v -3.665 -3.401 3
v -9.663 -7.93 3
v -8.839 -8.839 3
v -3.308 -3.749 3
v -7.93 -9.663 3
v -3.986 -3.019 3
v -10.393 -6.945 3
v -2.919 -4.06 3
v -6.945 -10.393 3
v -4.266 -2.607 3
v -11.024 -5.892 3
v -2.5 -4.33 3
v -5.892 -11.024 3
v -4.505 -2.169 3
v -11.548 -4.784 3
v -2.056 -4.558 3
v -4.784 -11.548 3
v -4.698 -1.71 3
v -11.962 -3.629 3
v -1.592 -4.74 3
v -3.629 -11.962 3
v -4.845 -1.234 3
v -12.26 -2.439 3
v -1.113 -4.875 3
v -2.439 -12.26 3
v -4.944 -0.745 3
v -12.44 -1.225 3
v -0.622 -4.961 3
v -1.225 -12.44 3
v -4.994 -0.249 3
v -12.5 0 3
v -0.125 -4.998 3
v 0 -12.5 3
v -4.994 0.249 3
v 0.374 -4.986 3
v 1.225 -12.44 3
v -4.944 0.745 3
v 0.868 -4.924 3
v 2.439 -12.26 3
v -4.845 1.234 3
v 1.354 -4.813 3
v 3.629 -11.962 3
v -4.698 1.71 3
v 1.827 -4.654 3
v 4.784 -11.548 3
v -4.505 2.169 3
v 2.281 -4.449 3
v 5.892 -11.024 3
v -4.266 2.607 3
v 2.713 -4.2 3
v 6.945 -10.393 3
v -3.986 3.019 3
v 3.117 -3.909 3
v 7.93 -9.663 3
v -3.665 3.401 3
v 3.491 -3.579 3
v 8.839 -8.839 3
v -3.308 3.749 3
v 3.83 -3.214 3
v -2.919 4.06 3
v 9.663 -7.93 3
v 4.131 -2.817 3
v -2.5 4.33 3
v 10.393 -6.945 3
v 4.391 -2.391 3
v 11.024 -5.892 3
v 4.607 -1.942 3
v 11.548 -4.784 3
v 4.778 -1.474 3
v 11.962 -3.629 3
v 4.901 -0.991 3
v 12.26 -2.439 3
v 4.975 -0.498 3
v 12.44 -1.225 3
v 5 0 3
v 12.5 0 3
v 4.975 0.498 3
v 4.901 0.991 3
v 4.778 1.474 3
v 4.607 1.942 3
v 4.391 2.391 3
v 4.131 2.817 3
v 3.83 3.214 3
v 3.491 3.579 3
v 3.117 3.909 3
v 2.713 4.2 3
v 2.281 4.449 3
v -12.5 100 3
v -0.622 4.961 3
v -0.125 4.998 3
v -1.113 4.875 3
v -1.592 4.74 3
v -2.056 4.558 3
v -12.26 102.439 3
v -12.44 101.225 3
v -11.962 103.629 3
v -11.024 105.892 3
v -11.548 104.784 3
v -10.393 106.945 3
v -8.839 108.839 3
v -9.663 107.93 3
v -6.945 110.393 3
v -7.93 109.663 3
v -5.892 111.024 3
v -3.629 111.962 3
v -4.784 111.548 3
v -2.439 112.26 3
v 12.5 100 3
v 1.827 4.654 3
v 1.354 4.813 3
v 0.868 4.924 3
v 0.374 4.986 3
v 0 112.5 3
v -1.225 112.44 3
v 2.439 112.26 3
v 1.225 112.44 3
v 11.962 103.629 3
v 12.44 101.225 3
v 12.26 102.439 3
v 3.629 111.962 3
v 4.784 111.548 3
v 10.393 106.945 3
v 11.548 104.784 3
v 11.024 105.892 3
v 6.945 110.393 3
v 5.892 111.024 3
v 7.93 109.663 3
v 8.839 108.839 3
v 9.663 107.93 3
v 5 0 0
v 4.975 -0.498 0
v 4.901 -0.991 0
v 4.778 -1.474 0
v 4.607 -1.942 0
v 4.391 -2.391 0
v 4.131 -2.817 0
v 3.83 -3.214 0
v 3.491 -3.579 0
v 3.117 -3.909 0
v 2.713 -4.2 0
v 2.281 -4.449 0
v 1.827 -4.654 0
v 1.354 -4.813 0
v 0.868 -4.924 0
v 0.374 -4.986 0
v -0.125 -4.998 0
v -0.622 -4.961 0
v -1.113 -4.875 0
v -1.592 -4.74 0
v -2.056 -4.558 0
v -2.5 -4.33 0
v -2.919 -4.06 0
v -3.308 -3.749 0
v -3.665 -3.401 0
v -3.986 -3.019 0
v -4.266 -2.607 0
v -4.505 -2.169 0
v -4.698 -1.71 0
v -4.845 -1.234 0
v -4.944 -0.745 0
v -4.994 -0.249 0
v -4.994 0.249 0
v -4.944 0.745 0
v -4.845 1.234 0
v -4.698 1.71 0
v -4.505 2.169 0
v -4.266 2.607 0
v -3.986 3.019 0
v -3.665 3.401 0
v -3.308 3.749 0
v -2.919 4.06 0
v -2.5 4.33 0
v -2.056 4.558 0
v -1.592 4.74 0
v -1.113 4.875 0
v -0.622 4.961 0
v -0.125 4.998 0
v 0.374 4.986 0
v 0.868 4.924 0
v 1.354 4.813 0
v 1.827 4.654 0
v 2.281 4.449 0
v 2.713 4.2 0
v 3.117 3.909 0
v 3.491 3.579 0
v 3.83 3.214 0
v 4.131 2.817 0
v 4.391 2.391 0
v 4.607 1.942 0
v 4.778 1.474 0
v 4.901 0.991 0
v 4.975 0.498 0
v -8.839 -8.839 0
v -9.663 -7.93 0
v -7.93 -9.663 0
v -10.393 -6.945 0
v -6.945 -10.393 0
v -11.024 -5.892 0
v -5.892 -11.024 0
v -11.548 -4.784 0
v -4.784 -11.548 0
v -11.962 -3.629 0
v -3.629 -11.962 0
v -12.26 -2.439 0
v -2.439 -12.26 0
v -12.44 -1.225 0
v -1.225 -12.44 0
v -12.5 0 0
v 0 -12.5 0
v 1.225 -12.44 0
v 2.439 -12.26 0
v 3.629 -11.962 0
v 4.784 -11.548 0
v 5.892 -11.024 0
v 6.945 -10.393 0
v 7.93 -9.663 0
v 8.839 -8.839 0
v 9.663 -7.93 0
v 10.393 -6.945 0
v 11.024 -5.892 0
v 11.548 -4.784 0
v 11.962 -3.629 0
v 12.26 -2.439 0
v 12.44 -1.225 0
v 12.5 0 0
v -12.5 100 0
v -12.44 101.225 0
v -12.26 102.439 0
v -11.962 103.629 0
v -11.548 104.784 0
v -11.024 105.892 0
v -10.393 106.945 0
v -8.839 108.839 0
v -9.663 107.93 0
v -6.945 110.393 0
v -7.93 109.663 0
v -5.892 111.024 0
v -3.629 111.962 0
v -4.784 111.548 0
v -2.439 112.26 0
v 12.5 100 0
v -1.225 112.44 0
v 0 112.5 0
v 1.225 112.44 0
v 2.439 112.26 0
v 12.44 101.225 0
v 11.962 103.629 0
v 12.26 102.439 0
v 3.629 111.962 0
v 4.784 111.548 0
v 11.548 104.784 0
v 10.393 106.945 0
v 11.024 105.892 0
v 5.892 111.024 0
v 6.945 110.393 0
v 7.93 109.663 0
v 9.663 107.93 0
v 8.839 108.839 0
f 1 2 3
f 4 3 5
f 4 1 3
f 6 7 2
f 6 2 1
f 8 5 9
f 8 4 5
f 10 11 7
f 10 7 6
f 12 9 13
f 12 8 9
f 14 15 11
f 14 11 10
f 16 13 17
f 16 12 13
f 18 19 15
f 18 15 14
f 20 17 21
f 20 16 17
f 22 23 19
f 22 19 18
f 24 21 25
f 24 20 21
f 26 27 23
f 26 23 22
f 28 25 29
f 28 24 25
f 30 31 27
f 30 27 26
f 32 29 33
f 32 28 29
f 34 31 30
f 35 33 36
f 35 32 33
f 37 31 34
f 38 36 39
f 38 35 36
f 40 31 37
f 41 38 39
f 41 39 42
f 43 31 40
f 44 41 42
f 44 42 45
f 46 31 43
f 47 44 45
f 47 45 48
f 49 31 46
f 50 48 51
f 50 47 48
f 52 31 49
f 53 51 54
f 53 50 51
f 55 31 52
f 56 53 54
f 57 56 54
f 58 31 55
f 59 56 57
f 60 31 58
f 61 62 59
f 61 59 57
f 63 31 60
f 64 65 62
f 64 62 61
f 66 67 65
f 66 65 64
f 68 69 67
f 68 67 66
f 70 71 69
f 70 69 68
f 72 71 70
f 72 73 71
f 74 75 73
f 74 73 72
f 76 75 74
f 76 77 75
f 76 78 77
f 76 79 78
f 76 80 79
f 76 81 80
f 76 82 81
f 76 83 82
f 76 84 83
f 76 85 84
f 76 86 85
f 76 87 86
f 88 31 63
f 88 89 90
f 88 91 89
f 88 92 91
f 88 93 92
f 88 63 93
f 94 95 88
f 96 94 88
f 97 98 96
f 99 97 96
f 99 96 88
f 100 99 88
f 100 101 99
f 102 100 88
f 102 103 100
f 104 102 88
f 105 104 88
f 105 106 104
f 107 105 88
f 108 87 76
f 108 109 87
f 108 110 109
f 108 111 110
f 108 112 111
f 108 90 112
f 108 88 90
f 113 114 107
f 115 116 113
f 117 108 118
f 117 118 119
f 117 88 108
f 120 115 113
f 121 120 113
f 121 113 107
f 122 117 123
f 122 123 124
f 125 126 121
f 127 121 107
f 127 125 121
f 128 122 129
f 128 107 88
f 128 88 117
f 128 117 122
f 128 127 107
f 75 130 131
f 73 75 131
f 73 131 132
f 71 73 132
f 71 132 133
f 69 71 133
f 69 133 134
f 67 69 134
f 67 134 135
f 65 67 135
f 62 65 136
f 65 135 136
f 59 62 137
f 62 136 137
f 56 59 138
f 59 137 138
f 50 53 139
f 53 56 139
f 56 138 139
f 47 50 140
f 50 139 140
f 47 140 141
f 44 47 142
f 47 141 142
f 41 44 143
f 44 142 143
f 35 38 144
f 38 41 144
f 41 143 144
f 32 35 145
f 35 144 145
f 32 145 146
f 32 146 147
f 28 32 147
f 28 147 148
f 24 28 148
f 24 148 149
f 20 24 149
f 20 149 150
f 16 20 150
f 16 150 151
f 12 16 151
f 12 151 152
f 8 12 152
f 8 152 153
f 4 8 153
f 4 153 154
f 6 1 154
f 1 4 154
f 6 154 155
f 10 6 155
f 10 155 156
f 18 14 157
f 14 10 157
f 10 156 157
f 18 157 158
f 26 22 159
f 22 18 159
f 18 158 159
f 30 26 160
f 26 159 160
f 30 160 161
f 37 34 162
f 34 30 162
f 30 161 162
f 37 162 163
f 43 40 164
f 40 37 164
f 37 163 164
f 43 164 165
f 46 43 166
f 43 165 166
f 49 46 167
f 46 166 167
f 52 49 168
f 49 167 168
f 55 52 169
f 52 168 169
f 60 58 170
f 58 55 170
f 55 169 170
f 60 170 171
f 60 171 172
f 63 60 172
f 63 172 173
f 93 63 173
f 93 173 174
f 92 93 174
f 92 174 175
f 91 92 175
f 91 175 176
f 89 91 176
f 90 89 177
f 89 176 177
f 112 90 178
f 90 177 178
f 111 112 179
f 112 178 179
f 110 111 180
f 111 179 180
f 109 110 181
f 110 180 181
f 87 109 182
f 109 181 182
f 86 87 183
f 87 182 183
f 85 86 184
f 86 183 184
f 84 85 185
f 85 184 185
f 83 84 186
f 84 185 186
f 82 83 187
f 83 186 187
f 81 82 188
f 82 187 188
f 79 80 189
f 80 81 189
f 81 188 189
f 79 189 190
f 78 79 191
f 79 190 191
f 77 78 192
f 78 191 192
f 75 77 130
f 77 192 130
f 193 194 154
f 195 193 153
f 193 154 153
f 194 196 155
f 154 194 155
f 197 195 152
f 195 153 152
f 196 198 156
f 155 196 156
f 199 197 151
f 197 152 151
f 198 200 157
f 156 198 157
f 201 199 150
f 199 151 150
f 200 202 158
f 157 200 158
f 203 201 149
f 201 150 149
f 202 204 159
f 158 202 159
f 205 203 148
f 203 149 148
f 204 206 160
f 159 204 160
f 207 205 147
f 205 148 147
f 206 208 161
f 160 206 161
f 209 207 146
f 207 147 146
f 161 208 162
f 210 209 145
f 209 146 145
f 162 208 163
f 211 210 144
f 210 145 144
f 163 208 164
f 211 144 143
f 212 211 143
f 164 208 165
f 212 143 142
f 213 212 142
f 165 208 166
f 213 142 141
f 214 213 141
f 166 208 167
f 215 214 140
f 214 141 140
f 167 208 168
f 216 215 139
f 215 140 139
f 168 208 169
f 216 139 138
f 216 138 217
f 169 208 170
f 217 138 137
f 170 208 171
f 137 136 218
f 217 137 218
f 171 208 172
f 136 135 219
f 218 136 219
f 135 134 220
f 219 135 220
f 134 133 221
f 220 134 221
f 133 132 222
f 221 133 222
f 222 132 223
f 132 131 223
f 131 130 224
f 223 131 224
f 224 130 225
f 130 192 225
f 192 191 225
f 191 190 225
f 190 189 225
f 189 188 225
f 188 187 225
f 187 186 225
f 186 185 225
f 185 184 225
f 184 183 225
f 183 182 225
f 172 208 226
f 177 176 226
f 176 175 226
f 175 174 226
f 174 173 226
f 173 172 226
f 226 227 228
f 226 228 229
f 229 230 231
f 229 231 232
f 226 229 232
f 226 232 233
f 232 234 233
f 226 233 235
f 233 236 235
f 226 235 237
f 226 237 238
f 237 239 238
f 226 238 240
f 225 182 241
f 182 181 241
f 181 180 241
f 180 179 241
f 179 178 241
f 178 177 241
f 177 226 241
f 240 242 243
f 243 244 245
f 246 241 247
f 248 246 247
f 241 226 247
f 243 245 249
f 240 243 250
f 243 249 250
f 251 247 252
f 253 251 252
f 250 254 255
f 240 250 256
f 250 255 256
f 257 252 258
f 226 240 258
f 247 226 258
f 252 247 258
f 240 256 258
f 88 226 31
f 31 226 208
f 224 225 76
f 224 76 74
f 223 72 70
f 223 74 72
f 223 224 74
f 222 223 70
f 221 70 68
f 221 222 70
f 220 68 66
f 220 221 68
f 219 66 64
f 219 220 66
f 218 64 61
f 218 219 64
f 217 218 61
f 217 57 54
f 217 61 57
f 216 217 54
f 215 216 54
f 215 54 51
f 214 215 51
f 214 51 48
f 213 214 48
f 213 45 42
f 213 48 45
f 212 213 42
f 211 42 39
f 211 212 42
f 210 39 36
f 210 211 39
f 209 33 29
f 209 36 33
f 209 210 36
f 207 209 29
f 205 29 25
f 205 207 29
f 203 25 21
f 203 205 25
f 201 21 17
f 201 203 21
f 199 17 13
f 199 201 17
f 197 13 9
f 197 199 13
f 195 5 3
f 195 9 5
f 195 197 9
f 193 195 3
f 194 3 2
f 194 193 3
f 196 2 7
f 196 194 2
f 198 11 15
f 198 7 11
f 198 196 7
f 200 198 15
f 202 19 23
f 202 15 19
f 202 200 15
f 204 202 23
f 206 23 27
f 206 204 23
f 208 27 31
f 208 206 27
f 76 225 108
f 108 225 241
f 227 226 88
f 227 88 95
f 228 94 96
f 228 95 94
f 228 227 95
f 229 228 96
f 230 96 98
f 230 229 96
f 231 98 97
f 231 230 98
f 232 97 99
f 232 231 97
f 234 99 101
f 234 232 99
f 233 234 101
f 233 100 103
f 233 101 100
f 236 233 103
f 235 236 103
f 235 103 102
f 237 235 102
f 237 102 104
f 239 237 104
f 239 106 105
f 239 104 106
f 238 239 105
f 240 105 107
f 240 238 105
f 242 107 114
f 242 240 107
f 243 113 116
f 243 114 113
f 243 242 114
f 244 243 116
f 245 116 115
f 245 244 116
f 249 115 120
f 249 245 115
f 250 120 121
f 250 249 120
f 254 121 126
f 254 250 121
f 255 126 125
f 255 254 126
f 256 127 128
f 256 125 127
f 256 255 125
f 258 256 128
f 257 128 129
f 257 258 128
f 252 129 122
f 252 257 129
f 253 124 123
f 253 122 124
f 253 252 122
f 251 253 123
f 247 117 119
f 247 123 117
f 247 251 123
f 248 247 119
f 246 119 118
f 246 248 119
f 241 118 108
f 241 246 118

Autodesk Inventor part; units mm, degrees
ref_plane "YZ Plane" through (0, 0, 0) normal (1, 0, 0) x (0, 1, 0)
ref_plane "XZ Plane" through (0, 0, 0) normal (0, 1, 0) x (-1, 0, 0)
ref_plane "XY Plane" through (0, 0, 0) normal (0, 0, 1) x (1, 0, 0)
sketch "草圖1" plane through (0, 0, 0) normal (0, 0, 1) x (1, 0, 0)
  circle A0 centre (0, 0) radius 5
  line L0 (0, 0) -> (0, 100) construction
  line L1 (12.5, 0) -> (12.5, 100)
  line L2 (-12.5, 100) -> (-12.5, 0)
  arc A1 (-12.5, 0) -> (12.5, 0) centre (0, 0) ccw
  arc A2 (12.5, 100) -> (-12.5, 100) centre (0, 100) ccw
  point P0 (0, 50)
  dimension "d0" = 10
  dimension "d1" = 100
  dimension "d2" = 25
extrude "擠出1" add sketch "草圖1" along normal blind 3
